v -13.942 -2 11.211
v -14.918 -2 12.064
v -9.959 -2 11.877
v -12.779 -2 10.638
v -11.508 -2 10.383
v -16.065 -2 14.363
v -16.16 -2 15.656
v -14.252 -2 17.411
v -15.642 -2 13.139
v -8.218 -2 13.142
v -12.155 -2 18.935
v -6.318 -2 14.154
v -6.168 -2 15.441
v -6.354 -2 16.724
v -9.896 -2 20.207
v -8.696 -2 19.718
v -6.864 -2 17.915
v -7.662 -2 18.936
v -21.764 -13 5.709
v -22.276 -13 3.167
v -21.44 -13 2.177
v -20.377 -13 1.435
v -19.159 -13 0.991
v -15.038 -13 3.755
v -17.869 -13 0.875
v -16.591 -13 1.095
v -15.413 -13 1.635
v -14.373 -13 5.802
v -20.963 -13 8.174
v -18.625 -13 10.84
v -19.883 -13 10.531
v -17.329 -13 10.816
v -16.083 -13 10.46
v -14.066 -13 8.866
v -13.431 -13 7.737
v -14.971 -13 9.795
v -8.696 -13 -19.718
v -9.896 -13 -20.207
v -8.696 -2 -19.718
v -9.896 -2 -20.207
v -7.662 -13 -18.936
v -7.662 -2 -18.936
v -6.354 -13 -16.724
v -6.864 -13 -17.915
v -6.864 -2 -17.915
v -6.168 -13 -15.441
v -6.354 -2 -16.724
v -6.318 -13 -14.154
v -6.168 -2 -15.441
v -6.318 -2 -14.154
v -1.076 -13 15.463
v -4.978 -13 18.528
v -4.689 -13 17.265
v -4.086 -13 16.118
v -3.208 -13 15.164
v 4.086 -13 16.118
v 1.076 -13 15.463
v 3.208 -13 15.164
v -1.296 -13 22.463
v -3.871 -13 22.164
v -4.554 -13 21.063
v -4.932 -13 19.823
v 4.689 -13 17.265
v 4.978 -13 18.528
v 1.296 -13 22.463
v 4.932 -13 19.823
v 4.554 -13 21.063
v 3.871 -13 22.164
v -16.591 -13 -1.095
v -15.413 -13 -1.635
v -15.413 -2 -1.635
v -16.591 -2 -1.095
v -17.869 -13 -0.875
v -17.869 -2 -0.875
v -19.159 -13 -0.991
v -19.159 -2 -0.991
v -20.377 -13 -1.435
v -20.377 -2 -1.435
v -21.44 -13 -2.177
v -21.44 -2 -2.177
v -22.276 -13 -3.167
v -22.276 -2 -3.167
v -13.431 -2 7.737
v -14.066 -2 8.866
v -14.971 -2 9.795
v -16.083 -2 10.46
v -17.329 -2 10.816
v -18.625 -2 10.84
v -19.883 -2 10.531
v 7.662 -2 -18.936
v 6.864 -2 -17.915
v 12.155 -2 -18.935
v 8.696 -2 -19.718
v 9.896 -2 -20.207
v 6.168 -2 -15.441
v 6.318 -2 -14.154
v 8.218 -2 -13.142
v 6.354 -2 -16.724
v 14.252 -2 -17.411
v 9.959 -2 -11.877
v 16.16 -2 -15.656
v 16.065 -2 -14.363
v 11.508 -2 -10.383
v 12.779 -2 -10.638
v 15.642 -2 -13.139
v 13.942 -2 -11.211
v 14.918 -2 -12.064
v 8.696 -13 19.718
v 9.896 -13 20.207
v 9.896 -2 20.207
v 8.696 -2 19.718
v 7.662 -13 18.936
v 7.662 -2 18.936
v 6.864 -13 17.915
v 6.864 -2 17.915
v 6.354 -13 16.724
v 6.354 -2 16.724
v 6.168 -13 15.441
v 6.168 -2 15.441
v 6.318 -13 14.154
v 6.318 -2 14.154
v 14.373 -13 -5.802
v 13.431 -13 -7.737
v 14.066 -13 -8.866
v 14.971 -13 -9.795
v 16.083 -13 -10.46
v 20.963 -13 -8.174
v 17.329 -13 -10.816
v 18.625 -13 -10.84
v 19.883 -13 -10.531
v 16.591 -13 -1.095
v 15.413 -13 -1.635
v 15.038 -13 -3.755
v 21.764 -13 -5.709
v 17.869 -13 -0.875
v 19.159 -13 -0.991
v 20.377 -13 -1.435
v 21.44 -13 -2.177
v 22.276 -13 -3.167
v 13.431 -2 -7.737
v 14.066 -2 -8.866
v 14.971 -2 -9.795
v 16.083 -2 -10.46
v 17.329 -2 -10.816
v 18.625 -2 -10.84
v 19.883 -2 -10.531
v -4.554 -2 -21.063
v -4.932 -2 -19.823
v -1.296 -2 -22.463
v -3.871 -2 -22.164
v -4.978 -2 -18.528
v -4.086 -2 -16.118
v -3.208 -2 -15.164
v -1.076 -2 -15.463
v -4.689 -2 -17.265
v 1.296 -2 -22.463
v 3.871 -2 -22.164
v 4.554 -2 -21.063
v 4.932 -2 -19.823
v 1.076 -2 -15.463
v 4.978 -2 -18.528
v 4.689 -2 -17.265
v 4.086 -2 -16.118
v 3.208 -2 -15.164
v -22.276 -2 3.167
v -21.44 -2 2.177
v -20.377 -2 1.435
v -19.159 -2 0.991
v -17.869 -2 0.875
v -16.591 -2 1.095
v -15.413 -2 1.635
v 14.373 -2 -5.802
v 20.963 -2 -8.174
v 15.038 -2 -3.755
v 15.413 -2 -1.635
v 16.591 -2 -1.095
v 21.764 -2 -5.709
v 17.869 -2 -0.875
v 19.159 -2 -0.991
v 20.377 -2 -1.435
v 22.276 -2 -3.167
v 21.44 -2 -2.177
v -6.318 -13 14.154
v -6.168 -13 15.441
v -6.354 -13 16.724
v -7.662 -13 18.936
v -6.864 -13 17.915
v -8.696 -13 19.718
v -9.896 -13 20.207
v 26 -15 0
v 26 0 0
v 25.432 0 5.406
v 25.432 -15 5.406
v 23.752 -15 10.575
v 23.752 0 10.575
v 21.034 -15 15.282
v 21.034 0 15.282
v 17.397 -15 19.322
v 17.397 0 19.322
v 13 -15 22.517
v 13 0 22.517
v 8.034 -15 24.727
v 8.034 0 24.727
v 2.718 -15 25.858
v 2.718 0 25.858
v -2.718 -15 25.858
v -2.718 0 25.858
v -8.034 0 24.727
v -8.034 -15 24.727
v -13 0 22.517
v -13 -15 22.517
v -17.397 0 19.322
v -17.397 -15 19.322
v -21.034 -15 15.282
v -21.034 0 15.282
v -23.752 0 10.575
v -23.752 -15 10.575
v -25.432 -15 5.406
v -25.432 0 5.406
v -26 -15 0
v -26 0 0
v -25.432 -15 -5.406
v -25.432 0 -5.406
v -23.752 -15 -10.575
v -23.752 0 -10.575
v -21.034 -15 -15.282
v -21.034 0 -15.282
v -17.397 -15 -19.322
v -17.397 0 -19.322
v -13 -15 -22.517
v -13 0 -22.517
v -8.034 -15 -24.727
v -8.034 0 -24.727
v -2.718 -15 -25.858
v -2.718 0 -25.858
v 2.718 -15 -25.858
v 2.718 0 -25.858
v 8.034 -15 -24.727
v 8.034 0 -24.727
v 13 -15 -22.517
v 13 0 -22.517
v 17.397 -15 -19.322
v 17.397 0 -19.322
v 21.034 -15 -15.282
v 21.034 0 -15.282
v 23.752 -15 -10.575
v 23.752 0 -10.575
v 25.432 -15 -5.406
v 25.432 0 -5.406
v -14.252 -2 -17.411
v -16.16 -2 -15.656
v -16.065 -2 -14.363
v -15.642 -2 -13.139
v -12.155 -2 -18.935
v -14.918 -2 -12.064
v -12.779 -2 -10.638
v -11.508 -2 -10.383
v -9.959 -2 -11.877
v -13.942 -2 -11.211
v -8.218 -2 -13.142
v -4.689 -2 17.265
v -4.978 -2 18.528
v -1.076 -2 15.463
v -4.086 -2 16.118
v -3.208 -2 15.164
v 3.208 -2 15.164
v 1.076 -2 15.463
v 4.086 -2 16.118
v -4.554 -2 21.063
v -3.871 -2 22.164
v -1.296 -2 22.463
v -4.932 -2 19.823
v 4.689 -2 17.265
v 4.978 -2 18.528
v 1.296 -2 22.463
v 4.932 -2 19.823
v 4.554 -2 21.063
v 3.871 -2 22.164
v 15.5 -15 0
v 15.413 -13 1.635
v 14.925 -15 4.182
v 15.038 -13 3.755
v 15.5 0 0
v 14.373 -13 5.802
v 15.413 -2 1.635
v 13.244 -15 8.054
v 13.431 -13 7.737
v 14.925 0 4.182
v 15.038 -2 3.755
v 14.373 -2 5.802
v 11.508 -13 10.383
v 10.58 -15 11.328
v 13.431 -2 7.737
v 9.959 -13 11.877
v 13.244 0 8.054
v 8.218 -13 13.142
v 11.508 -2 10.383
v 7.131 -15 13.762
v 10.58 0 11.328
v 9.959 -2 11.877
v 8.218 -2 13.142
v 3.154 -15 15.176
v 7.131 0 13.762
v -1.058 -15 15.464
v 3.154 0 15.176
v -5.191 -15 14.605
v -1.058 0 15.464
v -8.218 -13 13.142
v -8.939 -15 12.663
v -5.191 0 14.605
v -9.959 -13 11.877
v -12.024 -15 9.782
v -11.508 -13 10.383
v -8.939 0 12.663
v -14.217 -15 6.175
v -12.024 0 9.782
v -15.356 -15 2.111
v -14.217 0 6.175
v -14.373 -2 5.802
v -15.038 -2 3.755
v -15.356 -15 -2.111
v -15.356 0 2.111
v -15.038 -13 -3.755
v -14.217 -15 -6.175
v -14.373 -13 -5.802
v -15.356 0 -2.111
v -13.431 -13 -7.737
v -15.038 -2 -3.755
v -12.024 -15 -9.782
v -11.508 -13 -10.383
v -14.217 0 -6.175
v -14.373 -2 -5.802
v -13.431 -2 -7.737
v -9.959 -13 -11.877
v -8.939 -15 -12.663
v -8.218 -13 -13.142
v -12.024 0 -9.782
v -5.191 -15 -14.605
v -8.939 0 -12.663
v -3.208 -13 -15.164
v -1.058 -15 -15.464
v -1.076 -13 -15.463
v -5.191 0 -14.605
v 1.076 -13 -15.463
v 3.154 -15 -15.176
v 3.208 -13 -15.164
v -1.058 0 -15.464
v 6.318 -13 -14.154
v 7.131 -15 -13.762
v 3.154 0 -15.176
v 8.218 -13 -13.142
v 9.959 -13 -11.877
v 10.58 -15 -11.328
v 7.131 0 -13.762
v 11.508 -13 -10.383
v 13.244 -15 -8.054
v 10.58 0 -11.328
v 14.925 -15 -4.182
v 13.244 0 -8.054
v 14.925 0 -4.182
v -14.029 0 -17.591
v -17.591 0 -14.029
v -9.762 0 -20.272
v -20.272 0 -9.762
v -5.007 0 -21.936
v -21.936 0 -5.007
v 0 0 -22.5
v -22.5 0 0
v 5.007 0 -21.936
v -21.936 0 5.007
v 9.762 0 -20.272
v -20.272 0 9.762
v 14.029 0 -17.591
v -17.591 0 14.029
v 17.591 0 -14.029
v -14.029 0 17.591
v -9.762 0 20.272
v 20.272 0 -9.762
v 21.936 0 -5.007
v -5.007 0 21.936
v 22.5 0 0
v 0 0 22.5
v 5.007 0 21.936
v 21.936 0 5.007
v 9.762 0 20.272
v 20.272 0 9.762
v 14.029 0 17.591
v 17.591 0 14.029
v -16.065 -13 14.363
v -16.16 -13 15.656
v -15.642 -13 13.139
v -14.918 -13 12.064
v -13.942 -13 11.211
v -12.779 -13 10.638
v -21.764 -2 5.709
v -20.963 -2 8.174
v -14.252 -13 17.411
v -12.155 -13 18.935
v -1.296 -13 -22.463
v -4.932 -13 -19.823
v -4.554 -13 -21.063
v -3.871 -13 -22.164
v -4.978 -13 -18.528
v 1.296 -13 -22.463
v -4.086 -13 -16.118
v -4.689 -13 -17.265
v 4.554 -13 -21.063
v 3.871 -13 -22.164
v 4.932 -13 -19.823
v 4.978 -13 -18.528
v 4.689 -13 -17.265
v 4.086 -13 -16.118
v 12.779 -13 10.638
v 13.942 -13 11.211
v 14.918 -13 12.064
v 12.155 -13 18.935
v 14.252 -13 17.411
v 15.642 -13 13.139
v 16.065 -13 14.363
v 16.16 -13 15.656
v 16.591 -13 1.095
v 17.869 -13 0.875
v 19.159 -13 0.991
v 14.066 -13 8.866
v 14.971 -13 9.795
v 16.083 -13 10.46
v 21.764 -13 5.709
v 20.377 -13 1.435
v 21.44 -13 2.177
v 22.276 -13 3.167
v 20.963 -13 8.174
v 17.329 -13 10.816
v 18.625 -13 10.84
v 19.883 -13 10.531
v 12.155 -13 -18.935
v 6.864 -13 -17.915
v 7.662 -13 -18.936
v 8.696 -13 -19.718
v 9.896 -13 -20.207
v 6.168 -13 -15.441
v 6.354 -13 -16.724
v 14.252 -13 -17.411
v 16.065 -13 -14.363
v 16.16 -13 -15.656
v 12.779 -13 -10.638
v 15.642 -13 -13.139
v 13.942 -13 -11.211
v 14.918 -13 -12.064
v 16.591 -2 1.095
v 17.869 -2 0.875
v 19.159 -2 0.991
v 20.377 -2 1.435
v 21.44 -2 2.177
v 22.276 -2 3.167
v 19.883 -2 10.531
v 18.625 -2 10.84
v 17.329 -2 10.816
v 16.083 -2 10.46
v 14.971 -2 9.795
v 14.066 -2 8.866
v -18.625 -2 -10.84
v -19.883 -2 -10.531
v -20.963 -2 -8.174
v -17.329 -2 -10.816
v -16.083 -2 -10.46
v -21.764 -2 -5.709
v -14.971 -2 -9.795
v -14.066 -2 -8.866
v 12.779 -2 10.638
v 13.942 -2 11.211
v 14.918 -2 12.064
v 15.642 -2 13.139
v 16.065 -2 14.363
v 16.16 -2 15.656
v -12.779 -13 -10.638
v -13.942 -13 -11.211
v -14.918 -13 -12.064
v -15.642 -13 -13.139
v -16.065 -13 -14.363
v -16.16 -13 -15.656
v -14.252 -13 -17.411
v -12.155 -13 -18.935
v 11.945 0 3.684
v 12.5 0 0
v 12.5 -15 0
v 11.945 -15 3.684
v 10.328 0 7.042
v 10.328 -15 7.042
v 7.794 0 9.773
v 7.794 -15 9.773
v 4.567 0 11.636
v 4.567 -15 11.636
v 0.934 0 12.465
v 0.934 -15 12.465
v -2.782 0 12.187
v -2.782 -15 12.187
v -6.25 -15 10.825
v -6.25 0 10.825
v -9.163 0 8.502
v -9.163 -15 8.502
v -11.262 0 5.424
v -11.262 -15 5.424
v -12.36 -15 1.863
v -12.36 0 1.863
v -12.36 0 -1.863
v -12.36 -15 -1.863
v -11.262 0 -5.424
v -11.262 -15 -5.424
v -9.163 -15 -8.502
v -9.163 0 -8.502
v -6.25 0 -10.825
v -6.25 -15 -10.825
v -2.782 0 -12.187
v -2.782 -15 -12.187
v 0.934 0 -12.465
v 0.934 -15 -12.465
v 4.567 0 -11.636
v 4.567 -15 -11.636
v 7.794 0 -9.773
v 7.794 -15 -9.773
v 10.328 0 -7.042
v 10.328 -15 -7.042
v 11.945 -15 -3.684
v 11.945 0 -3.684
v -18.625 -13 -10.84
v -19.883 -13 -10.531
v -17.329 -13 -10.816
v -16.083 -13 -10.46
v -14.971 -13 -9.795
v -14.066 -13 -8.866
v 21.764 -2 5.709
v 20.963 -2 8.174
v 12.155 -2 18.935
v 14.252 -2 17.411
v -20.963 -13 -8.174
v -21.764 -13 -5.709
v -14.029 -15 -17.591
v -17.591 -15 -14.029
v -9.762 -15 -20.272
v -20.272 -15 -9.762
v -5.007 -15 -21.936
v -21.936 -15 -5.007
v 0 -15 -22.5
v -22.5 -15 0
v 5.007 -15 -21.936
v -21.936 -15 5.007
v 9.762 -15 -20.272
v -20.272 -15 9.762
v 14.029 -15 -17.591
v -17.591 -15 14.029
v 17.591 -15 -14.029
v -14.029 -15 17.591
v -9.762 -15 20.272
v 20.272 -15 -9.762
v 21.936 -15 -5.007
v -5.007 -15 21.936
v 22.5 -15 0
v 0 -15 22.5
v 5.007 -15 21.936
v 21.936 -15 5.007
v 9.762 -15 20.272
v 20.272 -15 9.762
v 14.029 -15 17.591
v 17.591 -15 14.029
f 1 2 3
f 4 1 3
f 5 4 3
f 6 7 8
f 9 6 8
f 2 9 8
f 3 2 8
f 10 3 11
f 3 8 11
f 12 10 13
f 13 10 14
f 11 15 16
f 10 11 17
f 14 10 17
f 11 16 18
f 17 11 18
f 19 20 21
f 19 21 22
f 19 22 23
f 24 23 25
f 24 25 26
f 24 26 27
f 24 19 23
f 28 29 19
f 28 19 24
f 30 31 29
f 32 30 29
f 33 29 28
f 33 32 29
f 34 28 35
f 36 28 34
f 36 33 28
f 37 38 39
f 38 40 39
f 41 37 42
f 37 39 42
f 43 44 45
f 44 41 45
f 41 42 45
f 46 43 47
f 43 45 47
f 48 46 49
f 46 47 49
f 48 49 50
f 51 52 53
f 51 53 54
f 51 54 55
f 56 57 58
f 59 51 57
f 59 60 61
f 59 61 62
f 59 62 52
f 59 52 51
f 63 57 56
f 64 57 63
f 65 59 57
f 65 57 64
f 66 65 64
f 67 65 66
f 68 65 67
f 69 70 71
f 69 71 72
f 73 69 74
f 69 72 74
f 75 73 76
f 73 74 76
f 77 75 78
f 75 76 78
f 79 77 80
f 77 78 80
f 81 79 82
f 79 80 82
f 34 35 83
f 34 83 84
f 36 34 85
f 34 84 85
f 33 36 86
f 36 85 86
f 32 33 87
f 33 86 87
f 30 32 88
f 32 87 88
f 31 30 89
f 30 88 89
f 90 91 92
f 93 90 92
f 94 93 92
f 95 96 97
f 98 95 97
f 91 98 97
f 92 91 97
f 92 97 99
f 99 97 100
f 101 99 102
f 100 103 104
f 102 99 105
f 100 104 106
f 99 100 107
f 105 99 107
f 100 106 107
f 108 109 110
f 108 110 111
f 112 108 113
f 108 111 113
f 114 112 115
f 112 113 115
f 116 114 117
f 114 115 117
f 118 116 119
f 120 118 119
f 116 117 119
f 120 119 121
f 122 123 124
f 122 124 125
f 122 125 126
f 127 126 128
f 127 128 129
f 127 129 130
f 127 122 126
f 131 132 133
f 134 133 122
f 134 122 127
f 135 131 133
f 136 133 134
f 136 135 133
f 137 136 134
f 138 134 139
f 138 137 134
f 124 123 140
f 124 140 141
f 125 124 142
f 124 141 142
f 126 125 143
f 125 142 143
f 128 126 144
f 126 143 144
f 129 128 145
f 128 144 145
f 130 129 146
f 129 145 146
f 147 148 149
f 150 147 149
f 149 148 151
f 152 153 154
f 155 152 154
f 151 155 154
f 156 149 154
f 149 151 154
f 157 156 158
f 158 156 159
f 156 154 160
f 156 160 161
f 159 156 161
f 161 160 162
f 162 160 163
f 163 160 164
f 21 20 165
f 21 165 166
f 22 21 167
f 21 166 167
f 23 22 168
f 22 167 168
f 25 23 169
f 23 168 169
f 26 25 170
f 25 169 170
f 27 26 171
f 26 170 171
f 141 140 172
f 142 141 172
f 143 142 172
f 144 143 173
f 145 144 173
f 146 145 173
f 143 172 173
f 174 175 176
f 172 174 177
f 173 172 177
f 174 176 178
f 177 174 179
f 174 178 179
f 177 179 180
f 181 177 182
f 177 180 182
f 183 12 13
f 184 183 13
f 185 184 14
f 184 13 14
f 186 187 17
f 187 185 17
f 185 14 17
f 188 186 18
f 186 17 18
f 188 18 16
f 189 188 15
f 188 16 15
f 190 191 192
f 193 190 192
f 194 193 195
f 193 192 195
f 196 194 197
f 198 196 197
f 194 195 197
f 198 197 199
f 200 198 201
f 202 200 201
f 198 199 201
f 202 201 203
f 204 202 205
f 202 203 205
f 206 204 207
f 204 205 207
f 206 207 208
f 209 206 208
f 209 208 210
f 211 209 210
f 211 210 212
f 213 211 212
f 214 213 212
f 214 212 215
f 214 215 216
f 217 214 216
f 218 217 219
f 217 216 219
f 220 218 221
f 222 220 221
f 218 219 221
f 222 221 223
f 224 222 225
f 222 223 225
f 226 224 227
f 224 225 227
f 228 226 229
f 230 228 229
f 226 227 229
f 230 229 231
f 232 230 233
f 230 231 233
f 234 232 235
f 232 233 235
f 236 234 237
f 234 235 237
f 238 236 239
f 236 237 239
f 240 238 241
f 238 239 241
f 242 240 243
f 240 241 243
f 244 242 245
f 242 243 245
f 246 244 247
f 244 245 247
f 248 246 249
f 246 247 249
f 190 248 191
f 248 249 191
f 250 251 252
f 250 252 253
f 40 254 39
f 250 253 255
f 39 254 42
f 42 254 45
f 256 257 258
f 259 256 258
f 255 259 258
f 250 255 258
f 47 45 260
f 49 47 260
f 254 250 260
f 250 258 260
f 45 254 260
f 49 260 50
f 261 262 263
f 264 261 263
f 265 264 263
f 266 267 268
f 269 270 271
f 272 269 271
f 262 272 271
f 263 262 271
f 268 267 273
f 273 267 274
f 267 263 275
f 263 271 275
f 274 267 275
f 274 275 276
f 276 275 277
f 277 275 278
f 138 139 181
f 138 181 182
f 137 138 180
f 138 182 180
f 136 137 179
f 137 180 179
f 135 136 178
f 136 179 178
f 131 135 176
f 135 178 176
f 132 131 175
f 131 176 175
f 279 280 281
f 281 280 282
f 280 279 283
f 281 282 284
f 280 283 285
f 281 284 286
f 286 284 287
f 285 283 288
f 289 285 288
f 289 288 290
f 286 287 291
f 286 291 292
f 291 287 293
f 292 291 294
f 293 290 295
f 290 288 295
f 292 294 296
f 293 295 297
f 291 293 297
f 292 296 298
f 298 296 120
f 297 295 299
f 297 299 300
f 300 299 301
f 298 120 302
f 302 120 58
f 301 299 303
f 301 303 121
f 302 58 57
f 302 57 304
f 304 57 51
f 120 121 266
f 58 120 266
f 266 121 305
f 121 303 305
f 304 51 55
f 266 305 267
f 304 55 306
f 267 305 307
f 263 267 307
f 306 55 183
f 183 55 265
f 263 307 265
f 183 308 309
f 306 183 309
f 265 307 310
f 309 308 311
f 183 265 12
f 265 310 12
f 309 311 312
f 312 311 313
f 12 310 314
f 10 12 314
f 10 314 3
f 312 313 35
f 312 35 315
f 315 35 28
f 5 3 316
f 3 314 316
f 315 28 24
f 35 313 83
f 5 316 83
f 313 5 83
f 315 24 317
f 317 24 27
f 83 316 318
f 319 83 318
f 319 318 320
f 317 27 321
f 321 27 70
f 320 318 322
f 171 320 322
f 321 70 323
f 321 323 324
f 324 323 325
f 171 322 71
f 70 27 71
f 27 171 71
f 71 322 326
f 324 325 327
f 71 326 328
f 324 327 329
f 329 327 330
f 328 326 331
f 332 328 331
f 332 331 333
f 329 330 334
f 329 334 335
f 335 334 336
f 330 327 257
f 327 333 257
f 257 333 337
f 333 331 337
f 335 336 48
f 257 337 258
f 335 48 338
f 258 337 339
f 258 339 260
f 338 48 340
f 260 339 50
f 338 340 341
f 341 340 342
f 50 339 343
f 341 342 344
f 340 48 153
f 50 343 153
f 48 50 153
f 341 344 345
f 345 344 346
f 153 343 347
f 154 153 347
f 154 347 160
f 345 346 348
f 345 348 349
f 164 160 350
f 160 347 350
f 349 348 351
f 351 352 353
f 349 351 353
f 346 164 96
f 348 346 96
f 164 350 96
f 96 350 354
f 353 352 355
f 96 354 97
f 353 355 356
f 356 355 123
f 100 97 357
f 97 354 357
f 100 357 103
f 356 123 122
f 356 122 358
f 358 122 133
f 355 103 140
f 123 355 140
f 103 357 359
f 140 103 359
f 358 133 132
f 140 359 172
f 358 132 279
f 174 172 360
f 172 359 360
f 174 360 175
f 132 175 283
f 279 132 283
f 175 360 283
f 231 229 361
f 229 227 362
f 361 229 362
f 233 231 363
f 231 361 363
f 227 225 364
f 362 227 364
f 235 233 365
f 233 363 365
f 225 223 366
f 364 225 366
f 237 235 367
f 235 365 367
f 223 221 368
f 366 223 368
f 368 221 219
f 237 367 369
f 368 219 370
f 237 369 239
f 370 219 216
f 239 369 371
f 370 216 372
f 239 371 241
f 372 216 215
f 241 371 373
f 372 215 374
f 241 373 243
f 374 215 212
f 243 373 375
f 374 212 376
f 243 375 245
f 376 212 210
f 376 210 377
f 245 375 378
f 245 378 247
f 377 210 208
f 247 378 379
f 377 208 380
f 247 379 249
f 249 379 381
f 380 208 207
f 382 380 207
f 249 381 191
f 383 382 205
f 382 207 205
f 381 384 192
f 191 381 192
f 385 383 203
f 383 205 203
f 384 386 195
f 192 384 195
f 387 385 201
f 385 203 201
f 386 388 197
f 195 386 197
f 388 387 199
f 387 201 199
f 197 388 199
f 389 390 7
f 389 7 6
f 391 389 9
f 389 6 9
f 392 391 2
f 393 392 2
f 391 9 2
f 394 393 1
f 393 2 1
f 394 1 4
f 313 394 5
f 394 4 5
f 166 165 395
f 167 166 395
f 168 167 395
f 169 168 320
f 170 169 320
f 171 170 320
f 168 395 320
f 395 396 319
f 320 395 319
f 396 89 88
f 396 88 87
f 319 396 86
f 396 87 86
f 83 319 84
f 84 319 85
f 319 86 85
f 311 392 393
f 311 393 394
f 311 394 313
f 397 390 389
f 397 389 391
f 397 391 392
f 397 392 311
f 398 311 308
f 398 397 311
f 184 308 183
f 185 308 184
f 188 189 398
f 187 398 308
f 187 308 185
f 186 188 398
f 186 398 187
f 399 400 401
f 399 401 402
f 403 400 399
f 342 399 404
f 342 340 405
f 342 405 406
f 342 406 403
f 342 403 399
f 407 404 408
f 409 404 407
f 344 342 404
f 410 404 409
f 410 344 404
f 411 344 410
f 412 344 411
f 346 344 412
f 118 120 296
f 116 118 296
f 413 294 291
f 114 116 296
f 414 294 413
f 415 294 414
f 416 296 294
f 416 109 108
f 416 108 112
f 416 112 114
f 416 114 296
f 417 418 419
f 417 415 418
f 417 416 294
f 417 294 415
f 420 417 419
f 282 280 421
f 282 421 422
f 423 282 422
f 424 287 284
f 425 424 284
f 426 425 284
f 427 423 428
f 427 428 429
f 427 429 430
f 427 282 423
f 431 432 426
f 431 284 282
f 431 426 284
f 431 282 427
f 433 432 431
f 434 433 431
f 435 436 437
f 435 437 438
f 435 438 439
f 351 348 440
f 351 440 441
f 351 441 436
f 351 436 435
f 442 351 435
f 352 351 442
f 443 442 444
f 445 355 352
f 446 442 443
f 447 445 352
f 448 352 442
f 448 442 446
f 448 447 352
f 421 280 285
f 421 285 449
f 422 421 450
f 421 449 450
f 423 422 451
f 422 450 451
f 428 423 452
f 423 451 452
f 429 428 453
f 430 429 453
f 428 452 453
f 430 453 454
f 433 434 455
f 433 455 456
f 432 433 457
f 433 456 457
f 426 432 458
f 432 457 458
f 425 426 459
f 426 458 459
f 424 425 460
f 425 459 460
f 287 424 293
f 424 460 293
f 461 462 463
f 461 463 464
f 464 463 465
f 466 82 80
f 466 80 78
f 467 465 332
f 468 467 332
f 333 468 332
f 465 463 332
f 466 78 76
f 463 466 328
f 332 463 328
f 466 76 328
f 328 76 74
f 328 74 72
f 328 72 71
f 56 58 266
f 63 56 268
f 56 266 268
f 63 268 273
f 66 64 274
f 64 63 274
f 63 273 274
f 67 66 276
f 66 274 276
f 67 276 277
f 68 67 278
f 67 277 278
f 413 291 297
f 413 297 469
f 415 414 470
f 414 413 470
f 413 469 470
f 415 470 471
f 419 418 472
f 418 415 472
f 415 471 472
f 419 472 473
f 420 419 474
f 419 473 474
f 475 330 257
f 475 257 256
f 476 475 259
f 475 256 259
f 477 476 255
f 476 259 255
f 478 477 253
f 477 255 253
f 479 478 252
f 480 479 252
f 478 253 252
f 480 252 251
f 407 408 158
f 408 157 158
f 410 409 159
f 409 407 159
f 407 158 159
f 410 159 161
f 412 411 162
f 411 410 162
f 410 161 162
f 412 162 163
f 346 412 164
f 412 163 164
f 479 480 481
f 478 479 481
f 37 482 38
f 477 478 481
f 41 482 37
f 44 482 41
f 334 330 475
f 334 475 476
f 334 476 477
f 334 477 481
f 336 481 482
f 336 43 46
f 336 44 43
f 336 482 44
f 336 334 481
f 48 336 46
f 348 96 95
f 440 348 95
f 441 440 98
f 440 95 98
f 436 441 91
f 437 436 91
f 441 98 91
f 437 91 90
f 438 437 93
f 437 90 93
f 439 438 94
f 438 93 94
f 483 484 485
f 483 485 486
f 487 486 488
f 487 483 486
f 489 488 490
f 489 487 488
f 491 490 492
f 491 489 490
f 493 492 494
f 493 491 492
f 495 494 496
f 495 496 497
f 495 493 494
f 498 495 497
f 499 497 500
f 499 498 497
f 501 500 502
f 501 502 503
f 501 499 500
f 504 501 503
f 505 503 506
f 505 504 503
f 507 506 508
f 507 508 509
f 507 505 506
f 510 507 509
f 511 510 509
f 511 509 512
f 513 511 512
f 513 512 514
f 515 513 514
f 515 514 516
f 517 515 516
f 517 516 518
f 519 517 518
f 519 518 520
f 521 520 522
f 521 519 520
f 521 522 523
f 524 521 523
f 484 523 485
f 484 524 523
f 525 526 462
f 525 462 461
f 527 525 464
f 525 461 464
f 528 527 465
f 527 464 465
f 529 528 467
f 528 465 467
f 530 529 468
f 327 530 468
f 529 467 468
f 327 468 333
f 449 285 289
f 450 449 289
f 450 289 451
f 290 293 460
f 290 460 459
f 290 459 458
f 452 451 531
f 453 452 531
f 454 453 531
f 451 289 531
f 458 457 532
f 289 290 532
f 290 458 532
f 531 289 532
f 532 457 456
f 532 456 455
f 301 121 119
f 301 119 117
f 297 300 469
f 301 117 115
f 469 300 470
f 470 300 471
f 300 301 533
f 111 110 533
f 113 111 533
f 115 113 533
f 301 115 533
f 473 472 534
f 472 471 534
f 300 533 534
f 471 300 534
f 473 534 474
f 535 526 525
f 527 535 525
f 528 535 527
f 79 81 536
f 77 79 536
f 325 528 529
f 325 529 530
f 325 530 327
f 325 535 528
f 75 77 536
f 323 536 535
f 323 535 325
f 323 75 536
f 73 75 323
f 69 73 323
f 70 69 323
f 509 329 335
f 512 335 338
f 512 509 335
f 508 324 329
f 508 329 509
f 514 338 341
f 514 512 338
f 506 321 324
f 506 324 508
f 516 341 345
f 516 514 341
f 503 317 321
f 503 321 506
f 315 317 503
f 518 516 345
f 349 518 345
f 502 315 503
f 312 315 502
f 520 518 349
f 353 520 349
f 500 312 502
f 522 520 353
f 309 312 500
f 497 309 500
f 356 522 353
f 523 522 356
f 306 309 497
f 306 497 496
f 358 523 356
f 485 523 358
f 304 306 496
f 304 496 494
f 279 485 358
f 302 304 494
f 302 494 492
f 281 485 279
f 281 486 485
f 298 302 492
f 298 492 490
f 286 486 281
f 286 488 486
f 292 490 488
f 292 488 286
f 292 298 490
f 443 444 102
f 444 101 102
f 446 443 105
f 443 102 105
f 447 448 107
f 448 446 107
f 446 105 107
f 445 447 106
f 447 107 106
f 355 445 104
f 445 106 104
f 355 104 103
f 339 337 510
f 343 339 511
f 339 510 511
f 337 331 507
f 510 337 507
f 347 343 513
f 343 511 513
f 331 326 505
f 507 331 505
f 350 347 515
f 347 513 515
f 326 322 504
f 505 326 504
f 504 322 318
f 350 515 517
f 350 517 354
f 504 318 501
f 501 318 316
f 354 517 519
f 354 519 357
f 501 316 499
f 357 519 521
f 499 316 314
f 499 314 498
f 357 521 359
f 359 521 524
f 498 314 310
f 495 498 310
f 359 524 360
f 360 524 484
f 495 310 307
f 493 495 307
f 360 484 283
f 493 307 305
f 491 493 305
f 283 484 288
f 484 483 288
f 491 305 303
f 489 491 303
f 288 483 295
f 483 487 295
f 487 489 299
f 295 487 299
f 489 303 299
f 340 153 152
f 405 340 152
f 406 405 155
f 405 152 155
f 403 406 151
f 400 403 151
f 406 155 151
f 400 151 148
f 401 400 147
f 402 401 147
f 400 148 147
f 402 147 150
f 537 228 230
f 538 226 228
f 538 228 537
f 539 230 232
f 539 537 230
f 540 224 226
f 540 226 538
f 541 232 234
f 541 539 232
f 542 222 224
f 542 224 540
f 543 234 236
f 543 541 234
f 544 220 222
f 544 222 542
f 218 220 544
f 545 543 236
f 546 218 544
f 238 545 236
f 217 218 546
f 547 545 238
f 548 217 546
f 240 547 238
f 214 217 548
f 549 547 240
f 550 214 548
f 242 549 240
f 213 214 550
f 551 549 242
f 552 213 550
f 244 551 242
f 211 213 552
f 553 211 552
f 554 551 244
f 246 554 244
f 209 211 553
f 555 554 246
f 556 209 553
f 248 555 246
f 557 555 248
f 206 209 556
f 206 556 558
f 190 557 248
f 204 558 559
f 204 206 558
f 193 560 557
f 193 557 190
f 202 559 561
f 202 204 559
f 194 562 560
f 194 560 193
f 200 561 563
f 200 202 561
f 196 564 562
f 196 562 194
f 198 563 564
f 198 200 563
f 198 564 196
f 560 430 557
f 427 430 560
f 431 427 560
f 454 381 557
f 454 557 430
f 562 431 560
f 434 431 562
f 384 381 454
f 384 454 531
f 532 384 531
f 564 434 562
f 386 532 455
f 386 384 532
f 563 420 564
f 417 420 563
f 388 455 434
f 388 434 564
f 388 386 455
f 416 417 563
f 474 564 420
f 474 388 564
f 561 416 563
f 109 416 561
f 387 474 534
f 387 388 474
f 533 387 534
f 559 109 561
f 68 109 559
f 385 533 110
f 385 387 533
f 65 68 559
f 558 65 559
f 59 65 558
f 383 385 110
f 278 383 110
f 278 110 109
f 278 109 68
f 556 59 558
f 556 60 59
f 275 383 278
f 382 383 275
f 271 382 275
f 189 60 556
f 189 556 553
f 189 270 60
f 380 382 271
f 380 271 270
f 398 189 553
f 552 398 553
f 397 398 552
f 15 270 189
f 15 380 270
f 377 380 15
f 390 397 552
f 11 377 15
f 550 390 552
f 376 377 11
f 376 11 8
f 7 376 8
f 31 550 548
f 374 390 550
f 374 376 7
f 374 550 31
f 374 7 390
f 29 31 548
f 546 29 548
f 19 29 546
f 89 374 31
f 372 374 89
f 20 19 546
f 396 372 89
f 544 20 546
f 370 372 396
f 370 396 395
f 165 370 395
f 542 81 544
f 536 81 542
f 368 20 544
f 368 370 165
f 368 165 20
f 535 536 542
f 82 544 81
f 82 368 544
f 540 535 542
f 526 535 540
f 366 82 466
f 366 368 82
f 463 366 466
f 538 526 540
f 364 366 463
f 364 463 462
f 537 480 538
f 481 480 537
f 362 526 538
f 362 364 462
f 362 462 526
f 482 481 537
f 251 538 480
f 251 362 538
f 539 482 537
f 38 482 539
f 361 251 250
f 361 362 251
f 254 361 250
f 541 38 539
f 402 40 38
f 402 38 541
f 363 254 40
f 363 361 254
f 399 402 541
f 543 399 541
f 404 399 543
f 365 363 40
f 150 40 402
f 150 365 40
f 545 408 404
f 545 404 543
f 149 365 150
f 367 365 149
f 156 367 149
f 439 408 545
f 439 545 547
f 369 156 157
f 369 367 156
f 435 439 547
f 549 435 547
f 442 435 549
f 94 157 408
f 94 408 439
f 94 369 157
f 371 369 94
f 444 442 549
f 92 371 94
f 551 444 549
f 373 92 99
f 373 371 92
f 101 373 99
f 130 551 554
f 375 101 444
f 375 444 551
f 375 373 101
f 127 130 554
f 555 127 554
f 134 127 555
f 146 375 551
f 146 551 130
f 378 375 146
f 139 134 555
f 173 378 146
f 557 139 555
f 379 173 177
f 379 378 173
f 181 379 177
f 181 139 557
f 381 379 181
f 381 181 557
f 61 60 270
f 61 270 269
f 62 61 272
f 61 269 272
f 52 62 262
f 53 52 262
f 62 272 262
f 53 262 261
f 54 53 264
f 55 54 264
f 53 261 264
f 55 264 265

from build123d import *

# Parameters (mm, degrees)
F0_R     = 26
F0_R_2   = 22.5
F0_R_3   = 15.5
F0_R_4   = 12.5
F1_DEPTH = 15
F3_R     = 5
F4_DEPTH = 11


with BuildPart() as f1:
    # F0 (on Front) → F1 (new body)
    with BuildSketch(Plane.XZ):
        Circle(F0_R)
        Circle(F0_R_2, mode=Mode.SUBTRACT)
        Circle(F0_R_3)
        Circle(F0_R_4, mode=Mode.SUBTRACT)
    extrude(amount=F1_DEPTH)

    # F3 (on offset) → F4 (join)
    with BuildSketch(Plane.XZ.offset(2)):
        with Locations((0, 19)):
            Circle(F3_R)
        with Locations((11.16792, 15.371323)):
            Circle(F3_R)
        with Locations((18.070074, 5.871323)):
            Circle(F3_R)
        with Locations((18.070074, -5.871323)):
            Circle(F3_R)
        with Locations((11.16792, -15.371323)):
            Circle(F3_R)
        with Locations((0, -19)):
            Circle(F3_R)
        with Locations((-11.16792, -15.371323)):
            Circle(F3_R)
        with Locations((-18.070074, -5.871323)):
            Circle(F3_R)
        with Locations((-18.070074, 5.871323)):
            Circle(F3_R)
        with Locations((-11.16792, 15.371323)):
            Circle(F3_R)
    extrude(amount=F4_DEPTH)


solid = f1.part
